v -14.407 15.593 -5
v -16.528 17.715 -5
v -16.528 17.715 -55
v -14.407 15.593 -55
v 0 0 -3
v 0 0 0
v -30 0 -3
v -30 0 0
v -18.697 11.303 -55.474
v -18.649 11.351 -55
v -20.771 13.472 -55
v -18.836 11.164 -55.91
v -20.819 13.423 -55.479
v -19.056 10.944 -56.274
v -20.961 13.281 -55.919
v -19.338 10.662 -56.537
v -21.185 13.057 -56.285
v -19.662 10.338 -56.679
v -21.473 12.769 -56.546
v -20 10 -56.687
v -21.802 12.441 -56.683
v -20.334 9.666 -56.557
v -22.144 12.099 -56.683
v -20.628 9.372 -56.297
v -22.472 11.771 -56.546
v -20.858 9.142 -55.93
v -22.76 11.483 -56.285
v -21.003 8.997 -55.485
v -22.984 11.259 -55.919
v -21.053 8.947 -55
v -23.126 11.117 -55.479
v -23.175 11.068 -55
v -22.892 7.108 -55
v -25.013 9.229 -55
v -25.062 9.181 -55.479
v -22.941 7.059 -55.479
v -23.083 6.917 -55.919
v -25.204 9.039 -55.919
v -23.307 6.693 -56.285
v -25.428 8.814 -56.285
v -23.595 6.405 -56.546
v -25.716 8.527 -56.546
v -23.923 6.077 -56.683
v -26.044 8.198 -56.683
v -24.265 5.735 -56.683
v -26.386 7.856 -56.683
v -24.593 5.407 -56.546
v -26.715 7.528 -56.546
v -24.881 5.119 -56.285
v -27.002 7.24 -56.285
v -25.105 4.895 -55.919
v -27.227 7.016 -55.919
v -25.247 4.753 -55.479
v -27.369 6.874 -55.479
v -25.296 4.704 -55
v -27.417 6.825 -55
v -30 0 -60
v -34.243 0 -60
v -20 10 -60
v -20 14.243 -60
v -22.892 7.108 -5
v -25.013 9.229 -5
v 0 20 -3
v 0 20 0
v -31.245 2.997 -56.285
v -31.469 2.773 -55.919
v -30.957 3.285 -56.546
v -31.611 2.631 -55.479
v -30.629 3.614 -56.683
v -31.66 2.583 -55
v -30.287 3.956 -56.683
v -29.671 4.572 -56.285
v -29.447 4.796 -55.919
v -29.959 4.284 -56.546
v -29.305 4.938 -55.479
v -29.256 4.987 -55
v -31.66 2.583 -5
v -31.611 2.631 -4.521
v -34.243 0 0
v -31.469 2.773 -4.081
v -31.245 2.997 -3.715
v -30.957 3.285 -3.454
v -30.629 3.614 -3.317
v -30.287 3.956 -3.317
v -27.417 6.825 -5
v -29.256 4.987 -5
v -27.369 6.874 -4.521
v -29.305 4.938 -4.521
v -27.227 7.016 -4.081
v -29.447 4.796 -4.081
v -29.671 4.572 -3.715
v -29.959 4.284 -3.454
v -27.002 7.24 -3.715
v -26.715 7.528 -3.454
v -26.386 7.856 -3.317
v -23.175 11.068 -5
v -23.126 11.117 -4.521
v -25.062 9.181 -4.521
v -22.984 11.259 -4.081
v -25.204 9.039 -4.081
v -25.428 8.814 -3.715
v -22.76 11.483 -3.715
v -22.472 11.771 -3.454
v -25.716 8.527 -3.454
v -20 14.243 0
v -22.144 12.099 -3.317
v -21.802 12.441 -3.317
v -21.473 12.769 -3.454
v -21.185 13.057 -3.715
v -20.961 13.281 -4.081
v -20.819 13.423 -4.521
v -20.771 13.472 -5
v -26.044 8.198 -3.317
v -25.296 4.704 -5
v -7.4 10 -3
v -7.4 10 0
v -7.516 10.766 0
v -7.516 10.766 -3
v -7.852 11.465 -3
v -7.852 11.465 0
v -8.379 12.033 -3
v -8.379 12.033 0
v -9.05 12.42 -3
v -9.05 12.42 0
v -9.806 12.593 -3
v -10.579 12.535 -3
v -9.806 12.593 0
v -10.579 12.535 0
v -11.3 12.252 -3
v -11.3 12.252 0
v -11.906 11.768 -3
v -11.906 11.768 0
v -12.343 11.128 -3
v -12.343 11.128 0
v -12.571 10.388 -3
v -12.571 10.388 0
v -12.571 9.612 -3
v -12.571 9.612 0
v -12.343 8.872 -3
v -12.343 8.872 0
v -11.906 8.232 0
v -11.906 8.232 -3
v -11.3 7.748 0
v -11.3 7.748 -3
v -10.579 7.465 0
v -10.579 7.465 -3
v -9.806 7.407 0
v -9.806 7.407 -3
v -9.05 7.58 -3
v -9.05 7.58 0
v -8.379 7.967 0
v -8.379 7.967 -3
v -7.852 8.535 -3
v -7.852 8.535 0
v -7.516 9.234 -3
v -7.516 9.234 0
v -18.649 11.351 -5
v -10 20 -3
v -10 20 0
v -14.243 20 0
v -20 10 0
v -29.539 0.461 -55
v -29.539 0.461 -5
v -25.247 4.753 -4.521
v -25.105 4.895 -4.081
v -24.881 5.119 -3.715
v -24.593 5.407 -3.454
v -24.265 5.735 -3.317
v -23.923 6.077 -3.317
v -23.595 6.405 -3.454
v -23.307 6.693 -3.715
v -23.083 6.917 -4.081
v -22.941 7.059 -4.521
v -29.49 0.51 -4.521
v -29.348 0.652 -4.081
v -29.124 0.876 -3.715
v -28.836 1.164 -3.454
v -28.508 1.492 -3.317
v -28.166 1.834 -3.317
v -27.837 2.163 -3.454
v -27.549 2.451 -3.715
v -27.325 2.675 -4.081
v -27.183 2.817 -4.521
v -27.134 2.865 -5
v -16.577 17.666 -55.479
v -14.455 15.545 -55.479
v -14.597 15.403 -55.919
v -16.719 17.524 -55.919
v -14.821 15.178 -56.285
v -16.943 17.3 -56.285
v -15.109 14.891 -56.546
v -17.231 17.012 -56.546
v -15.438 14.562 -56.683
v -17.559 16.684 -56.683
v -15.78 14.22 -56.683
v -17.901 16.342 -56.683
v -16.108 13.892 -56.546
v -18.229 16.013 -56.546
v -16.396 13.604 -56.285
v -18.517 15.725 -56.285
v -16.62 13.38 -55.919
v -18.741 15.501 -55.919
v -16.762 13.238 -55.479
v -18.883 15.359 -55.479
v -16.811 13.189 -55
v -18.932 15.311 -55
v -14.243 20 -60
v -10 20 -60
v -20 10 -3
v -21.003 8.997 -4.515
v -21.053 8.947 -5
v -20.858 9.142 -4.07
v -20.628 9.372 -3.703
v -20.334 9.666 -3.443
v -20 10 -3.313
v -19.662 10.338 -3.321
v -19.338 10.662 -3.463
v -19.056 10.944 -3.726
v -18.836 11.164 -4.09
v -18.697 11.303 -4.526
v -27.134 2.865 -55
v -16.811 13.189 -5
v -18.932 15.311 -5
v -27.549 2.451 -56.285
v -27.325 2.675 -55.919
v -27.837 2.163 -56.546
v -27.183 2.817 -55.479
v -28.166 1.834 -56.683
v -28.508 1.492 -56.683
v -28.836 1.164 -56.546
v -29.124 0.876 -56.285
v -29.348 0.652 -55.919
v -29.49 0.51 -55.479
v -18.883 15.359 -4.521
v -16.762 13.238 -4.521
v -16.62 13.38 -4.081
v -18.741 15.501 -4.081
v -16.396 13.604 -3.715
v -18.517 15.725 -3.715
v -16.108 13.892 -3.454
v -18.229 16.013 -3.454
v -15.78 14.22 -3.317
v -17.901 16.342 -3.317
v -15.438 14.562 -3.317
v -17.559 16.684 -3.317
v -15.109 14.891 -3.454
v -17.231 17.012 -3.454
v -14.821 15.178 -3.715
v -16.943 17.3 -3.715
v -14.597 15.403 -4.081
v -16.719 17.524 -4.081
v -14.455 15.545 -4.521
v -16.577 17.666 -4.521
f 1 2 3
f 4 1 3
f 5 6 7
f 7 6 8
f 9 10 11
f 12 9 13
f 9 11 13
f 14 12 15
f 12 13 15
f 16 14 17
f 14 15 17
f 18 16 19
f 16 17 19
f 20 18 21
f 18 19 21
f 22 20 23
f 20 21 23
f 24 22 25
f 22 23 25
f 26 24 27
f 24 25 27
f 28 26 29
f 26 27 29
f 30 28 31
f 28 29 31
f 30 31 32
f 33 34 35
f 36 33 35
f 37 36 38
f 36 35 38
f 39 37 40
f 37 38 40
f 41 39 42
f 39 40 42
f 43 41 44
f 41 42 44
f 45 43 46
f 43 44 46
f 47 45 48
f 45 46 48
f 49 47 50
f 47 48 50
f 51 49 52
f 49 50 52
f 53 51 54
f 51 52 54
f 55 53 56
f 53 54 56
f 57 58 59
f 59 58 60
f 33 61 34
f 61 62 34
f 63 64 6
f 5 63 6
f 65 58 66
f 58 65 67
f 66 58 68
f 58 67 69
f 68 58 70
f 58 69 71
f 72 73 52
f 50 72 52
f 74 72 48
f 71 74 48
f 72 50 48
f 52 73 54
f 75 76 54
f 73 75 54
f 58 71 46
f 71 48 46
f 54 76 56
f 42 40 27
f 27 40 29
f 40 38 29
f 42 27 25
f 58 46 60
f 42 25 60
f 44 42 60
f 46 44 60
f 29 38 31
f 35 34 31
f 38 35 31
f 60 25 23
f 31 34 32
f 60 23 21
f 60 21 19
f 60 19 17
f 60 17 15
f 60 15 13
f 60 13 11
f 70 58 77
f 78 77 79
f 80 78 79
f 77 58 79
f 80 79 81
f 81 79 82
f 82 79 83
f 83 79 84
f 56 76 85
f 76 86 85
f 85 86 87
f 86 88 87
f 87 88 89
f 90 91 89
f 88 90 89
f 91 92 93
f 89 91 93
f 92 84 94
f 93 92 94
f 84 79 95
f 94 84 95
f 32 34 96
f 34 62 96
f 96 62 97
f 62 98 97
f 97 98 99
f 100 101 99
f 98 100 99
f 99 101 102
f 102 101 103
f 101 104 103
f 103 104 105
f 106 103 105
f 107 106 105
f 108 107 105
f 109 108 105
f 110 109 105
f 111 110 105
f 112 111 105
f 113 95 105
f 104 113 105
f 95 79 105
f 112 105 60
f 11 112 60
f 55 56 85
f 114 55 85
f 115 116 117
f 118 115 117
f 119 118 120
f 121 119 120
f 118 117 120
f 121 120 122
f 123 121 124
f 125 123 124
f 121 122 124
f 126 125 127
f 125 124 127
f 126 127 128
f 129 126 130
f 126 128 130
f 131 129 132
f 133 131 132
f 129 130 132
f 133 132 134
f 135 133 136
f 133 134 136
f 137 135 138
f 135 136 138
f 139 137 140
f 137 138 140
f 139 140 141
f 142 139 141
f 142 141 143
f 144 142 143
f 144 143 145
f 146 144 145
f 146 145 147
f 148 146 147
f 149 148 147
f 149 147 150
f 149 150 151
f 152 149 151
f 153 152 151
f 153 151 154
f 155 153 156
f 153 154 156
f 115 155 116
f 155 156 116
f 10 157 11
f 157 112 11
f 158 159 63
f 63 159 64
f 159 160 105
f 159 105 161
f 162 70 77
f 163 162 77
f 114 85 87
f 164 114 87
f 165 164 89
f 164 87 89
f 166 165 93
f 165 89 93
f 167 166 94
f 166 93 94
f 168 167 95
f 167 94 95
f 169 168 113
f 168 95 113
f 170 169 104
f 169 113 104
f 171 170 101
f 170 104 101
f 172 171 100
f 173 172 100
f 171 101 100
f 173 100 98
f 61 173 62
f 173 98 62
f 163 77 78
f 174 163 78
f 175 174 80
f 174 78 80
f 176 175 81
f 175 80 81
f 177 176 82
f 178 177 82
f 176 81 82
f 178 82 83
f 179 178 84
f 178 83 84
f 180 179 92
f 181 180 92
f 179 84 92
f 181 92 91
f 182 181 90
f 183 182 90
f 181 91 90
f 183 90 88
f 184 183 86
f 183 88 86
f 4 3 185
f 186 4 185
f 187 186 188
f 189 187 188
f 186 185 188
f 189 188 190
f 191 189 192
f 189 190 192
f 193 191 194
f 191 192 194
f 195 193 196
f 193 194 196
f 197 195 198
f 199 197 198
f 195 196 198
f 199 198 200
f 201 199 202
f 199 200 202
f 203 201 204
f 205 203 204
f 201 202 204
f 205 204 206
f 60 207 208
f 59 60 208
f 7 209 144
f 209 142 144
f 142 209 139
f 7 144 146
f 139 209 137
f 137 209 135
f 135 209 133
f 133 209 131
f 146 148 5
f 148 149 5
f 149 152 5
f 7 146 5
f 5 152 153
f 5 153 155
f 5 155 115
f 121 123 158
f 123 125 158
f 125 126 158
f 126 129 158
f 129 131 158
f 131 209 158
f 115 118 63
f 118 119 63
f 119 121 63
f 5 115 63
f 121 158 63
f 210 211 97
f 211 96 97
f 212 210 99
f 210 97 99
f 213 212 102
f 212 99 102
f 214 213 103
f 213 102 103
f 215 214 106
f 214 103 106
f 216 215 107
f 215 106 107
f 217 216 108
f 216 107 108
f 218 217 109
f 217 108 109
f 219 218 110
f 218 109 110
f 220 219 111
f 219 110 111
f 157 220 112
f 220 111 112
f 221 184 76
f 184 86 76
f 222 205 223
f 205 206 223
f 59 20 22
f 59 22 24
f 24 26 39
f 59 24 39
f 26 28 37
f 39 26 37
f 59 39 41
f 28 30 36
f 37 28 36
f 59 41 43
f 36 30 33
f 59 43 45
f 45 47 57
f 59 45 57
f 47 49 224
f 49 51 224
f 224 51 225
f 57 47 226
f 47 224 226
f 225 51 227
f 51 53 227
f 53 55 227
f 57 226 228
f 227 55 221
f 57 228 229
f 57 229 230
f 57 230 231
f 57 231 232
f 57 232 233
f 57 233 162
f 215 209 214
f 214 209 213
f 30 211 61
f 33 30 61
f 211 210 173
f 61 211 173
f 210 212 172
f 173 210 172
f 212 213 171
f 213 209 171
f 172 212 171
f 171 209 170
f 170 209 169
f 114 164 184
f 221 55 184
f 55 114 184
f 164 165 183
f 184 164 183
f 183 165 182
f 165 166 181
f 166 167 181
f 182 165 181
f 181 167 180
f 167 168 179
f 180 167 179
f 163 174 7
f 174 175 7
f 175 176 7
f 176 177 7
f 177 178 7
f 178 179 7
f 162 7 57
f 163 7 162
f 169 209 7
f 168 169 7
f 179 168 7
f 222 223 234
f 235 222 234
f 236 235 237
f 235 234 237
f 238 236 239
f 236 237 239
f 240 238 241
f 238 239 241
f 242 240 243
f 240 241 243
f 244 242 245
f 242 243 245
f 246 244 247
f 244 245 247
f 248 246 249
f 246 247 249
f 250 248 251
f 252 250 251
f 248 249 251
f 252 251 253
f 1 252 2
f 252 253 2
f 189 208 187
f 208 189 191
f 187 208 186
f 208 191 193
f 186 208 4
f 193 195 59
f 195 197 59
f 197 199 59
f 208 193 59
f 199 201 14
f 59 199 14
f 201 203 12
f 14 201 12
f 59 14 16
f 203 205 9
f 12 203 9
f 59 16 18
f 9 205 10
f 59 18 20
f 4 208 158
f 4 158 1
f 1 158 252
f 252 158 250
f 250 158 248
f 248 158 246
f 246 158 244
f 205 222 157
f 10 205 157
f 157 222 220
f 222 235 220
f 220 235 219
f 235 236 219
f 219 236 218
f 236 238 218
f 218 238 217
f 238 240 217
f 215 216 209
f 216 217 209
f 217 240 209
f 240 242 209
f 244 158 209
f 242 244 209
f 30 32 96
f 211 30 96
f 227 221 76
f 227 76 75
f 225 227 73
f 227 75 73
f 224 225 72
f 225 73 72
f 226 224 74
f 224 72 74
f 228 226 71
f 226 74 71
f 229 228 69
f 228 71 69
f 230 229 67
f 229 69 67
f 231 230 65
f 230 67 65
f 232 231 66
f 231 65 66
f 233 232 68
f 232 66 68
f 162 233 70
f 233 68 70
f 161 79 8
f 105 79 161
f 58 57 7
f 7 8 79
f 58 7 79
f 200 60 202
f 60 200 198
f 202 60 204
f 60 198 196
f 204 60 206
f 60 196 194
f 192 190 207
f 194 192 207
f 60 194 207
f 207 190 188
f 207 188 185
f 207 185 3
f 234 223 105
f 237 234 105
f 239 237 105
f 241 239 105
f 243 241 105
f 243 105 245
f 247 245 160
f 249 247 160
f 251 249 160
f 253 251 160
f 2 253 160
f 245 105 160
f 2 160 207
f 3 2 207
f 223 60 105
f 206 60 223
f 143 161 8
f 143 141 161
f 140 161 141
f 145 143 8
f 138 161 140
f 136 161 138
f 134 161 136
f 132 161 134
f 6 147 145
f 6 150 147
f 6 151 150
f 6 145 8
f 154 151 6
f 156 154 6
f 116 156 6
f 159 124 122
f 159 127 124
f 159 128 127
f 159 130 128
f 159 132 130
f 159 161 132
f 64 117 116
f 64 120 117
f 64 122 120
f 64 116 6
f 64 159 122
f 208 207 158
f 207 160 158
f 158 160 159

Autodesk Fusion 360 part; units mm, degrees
sketch "Sketch1" plane through (0, 0, 0) normal (0, 0, 1) x (1, 0, 0)
  line L0 (0, 0) -> (-20, 0)
  line L1 (-20, 0) -> (-20, 20)
  line L2 (-20, 20) -> (0, 20)
  line L3 (0, 20) -> (0, 0)
  line L4 (-20, 20) -> (0, 0) construction
  circle A0 centre (-10, 10) radius 2.6
  line L5 (-10, 20) -> (-20, 10)
  line L6 (-20, 10) -> (-34.1421, -4.1421)
  line L7 (-20, 10) -> (-0.3454, 10) construction
  line L8 (-34.1421, -4.1421) -> (-36.2635, -2.0208)
  line L9 (-34.1421, -4.1421) -> (-30.4876, -4.1421) construction
  line L10 (-36.2635, -2.0208) -> (-7.9792, 26.2635)
  line L11 (-36.2635, -2.0208) -> (3.0294, -2.0208) construction
  line L12 (-10, 20) -> (-12.1213, 22.1213)
  line L13 (-20, 0) -> (-34.2426, 0)
  dimension "d5" = 20
  dimension "d6" = 20
  dimension "d7" = 5.2
  dimension "d8" = 135
  dimension "d9" = 20
  dimension "d10" = 135
  dimension "d11" = 3
  dimension "d14" = 45
  dimension "d15" = 40
extrude "Extrude1" add sketch "Sketch1" against normal blind 3 contours L0 L1 L2 L3 L5 | L1 L6 L13 makes body 1
extrude "Extrude2" add sketch "Sketch1" against normal blind 60 separate body contours L1 L6 L10 L13 | L1 L2 L5 L10 makes body 2
sketch "Sketch2" plane through (-17.1213, 17.1213, 0) normal (-0.7071, 0.7071, 0) x (-0.7071, -0.7071, 0)
  line L0 (24.2132, 0) -> (-4.0711, 0)
  line L1 (-4.0711, 0) -> (-4.0711, -60)
  line L2 (-4.0711, -60) -> (24.2132, -60)
  line L3 (24.2132, -60) -> (24.2132, 0)
  line L4 (24.2132, -30) -> (-4.0711, -30) construction
  line L5 (17.1608, -55) -> (20.5608, -55) construction
  line L6 (20.5608, -55) -> (20.5608, -5)
  line L7 (20.5608, -5) -> (17.1608, -5) construction
  line L8 (17.1608, -5) -> (17.1608, -55)
  line L9 (17.1608, -55) -> (20.5608, -5) construction
  line L10 (20.5608, -55) -> (17.1608, -5) construction
  arc A0 (17.1765, -54.7699) -> (20.5452, -54.7699) centre (18.8608, -55) ccw
  arc A1 (20.5452, -5.2301) -> (17.1765, -5.2301) centre (18.8608, -5) ccw
  arc A2 (11.1765, -54.7699) -> (14.5452, -54.7699) centre (12.8608, -55) ccw
  line L11 (14.5608, -55) -> (14.5608, -5)
  line L12 (11.1608, -5) -> (11.1608, -55)
  arc A3 (14.5452, -5.2301) -> (11.1765, -5.2301) centre (12.8608, -5) ccw
  arc A4 (5.1765, -54.7699) -> (8.5452, -54.7699) centre (6.8608, -55) ccw
  line L13 (8.5608, -55) -> (8.5608, -5)
  line L14 (5.1608, -5) -> (5.1608, -55)
  arc A5 (8.5452, -5.2301) -> (5.1765, -5.2301) centre (6.8608, -5) ccw
  arc A6 (-0.8235, -54.7699) -> (2.5452, -54.7699) centre (0.8608, -55) ccw
  line L15 (2.5608, -55) -> (2.5608, -5)
  line L16 (-0.8392, -5) -> (-0.8392, -55)
  arc A7 (2.5452, -5.2301) -> (-0.8235, -5.2301) centre (0.8608, -5) ccw
  point P0 (18.8608, -30)
  dimension "d23" = 3.4
  dimension "d24" = 50
  dimension "d27" = -6
  dimension "d28" = 0
extrude "Extrude3" cut sketch "Sketch2" against normal blind 3 contours L6 L8 A0 A1 | A2 L11 L12 A3 | A4 L13 L14 A5 | A6 L15 L16 A7 bodies 2
combine "Combine1" operation add target body 1 tool bodies 2
equation "holder_depth = 20 mm"
equation "holder_width = 20 mm"
equation "d5 = holder_width"
equation "d6 = holder_depth"
equation "d7 = m5_hole"
equation "d11 = holder_base_height"
equation "holder_base_height = 3 mm"
equation "holder_height = 60 mm"
equation "d23 = m3_hole"
equation "d24 = holder_height - 10 mm"
equation "m3_hole = 3.4 mm"
equation "m5_hole = 5.2 mm"
